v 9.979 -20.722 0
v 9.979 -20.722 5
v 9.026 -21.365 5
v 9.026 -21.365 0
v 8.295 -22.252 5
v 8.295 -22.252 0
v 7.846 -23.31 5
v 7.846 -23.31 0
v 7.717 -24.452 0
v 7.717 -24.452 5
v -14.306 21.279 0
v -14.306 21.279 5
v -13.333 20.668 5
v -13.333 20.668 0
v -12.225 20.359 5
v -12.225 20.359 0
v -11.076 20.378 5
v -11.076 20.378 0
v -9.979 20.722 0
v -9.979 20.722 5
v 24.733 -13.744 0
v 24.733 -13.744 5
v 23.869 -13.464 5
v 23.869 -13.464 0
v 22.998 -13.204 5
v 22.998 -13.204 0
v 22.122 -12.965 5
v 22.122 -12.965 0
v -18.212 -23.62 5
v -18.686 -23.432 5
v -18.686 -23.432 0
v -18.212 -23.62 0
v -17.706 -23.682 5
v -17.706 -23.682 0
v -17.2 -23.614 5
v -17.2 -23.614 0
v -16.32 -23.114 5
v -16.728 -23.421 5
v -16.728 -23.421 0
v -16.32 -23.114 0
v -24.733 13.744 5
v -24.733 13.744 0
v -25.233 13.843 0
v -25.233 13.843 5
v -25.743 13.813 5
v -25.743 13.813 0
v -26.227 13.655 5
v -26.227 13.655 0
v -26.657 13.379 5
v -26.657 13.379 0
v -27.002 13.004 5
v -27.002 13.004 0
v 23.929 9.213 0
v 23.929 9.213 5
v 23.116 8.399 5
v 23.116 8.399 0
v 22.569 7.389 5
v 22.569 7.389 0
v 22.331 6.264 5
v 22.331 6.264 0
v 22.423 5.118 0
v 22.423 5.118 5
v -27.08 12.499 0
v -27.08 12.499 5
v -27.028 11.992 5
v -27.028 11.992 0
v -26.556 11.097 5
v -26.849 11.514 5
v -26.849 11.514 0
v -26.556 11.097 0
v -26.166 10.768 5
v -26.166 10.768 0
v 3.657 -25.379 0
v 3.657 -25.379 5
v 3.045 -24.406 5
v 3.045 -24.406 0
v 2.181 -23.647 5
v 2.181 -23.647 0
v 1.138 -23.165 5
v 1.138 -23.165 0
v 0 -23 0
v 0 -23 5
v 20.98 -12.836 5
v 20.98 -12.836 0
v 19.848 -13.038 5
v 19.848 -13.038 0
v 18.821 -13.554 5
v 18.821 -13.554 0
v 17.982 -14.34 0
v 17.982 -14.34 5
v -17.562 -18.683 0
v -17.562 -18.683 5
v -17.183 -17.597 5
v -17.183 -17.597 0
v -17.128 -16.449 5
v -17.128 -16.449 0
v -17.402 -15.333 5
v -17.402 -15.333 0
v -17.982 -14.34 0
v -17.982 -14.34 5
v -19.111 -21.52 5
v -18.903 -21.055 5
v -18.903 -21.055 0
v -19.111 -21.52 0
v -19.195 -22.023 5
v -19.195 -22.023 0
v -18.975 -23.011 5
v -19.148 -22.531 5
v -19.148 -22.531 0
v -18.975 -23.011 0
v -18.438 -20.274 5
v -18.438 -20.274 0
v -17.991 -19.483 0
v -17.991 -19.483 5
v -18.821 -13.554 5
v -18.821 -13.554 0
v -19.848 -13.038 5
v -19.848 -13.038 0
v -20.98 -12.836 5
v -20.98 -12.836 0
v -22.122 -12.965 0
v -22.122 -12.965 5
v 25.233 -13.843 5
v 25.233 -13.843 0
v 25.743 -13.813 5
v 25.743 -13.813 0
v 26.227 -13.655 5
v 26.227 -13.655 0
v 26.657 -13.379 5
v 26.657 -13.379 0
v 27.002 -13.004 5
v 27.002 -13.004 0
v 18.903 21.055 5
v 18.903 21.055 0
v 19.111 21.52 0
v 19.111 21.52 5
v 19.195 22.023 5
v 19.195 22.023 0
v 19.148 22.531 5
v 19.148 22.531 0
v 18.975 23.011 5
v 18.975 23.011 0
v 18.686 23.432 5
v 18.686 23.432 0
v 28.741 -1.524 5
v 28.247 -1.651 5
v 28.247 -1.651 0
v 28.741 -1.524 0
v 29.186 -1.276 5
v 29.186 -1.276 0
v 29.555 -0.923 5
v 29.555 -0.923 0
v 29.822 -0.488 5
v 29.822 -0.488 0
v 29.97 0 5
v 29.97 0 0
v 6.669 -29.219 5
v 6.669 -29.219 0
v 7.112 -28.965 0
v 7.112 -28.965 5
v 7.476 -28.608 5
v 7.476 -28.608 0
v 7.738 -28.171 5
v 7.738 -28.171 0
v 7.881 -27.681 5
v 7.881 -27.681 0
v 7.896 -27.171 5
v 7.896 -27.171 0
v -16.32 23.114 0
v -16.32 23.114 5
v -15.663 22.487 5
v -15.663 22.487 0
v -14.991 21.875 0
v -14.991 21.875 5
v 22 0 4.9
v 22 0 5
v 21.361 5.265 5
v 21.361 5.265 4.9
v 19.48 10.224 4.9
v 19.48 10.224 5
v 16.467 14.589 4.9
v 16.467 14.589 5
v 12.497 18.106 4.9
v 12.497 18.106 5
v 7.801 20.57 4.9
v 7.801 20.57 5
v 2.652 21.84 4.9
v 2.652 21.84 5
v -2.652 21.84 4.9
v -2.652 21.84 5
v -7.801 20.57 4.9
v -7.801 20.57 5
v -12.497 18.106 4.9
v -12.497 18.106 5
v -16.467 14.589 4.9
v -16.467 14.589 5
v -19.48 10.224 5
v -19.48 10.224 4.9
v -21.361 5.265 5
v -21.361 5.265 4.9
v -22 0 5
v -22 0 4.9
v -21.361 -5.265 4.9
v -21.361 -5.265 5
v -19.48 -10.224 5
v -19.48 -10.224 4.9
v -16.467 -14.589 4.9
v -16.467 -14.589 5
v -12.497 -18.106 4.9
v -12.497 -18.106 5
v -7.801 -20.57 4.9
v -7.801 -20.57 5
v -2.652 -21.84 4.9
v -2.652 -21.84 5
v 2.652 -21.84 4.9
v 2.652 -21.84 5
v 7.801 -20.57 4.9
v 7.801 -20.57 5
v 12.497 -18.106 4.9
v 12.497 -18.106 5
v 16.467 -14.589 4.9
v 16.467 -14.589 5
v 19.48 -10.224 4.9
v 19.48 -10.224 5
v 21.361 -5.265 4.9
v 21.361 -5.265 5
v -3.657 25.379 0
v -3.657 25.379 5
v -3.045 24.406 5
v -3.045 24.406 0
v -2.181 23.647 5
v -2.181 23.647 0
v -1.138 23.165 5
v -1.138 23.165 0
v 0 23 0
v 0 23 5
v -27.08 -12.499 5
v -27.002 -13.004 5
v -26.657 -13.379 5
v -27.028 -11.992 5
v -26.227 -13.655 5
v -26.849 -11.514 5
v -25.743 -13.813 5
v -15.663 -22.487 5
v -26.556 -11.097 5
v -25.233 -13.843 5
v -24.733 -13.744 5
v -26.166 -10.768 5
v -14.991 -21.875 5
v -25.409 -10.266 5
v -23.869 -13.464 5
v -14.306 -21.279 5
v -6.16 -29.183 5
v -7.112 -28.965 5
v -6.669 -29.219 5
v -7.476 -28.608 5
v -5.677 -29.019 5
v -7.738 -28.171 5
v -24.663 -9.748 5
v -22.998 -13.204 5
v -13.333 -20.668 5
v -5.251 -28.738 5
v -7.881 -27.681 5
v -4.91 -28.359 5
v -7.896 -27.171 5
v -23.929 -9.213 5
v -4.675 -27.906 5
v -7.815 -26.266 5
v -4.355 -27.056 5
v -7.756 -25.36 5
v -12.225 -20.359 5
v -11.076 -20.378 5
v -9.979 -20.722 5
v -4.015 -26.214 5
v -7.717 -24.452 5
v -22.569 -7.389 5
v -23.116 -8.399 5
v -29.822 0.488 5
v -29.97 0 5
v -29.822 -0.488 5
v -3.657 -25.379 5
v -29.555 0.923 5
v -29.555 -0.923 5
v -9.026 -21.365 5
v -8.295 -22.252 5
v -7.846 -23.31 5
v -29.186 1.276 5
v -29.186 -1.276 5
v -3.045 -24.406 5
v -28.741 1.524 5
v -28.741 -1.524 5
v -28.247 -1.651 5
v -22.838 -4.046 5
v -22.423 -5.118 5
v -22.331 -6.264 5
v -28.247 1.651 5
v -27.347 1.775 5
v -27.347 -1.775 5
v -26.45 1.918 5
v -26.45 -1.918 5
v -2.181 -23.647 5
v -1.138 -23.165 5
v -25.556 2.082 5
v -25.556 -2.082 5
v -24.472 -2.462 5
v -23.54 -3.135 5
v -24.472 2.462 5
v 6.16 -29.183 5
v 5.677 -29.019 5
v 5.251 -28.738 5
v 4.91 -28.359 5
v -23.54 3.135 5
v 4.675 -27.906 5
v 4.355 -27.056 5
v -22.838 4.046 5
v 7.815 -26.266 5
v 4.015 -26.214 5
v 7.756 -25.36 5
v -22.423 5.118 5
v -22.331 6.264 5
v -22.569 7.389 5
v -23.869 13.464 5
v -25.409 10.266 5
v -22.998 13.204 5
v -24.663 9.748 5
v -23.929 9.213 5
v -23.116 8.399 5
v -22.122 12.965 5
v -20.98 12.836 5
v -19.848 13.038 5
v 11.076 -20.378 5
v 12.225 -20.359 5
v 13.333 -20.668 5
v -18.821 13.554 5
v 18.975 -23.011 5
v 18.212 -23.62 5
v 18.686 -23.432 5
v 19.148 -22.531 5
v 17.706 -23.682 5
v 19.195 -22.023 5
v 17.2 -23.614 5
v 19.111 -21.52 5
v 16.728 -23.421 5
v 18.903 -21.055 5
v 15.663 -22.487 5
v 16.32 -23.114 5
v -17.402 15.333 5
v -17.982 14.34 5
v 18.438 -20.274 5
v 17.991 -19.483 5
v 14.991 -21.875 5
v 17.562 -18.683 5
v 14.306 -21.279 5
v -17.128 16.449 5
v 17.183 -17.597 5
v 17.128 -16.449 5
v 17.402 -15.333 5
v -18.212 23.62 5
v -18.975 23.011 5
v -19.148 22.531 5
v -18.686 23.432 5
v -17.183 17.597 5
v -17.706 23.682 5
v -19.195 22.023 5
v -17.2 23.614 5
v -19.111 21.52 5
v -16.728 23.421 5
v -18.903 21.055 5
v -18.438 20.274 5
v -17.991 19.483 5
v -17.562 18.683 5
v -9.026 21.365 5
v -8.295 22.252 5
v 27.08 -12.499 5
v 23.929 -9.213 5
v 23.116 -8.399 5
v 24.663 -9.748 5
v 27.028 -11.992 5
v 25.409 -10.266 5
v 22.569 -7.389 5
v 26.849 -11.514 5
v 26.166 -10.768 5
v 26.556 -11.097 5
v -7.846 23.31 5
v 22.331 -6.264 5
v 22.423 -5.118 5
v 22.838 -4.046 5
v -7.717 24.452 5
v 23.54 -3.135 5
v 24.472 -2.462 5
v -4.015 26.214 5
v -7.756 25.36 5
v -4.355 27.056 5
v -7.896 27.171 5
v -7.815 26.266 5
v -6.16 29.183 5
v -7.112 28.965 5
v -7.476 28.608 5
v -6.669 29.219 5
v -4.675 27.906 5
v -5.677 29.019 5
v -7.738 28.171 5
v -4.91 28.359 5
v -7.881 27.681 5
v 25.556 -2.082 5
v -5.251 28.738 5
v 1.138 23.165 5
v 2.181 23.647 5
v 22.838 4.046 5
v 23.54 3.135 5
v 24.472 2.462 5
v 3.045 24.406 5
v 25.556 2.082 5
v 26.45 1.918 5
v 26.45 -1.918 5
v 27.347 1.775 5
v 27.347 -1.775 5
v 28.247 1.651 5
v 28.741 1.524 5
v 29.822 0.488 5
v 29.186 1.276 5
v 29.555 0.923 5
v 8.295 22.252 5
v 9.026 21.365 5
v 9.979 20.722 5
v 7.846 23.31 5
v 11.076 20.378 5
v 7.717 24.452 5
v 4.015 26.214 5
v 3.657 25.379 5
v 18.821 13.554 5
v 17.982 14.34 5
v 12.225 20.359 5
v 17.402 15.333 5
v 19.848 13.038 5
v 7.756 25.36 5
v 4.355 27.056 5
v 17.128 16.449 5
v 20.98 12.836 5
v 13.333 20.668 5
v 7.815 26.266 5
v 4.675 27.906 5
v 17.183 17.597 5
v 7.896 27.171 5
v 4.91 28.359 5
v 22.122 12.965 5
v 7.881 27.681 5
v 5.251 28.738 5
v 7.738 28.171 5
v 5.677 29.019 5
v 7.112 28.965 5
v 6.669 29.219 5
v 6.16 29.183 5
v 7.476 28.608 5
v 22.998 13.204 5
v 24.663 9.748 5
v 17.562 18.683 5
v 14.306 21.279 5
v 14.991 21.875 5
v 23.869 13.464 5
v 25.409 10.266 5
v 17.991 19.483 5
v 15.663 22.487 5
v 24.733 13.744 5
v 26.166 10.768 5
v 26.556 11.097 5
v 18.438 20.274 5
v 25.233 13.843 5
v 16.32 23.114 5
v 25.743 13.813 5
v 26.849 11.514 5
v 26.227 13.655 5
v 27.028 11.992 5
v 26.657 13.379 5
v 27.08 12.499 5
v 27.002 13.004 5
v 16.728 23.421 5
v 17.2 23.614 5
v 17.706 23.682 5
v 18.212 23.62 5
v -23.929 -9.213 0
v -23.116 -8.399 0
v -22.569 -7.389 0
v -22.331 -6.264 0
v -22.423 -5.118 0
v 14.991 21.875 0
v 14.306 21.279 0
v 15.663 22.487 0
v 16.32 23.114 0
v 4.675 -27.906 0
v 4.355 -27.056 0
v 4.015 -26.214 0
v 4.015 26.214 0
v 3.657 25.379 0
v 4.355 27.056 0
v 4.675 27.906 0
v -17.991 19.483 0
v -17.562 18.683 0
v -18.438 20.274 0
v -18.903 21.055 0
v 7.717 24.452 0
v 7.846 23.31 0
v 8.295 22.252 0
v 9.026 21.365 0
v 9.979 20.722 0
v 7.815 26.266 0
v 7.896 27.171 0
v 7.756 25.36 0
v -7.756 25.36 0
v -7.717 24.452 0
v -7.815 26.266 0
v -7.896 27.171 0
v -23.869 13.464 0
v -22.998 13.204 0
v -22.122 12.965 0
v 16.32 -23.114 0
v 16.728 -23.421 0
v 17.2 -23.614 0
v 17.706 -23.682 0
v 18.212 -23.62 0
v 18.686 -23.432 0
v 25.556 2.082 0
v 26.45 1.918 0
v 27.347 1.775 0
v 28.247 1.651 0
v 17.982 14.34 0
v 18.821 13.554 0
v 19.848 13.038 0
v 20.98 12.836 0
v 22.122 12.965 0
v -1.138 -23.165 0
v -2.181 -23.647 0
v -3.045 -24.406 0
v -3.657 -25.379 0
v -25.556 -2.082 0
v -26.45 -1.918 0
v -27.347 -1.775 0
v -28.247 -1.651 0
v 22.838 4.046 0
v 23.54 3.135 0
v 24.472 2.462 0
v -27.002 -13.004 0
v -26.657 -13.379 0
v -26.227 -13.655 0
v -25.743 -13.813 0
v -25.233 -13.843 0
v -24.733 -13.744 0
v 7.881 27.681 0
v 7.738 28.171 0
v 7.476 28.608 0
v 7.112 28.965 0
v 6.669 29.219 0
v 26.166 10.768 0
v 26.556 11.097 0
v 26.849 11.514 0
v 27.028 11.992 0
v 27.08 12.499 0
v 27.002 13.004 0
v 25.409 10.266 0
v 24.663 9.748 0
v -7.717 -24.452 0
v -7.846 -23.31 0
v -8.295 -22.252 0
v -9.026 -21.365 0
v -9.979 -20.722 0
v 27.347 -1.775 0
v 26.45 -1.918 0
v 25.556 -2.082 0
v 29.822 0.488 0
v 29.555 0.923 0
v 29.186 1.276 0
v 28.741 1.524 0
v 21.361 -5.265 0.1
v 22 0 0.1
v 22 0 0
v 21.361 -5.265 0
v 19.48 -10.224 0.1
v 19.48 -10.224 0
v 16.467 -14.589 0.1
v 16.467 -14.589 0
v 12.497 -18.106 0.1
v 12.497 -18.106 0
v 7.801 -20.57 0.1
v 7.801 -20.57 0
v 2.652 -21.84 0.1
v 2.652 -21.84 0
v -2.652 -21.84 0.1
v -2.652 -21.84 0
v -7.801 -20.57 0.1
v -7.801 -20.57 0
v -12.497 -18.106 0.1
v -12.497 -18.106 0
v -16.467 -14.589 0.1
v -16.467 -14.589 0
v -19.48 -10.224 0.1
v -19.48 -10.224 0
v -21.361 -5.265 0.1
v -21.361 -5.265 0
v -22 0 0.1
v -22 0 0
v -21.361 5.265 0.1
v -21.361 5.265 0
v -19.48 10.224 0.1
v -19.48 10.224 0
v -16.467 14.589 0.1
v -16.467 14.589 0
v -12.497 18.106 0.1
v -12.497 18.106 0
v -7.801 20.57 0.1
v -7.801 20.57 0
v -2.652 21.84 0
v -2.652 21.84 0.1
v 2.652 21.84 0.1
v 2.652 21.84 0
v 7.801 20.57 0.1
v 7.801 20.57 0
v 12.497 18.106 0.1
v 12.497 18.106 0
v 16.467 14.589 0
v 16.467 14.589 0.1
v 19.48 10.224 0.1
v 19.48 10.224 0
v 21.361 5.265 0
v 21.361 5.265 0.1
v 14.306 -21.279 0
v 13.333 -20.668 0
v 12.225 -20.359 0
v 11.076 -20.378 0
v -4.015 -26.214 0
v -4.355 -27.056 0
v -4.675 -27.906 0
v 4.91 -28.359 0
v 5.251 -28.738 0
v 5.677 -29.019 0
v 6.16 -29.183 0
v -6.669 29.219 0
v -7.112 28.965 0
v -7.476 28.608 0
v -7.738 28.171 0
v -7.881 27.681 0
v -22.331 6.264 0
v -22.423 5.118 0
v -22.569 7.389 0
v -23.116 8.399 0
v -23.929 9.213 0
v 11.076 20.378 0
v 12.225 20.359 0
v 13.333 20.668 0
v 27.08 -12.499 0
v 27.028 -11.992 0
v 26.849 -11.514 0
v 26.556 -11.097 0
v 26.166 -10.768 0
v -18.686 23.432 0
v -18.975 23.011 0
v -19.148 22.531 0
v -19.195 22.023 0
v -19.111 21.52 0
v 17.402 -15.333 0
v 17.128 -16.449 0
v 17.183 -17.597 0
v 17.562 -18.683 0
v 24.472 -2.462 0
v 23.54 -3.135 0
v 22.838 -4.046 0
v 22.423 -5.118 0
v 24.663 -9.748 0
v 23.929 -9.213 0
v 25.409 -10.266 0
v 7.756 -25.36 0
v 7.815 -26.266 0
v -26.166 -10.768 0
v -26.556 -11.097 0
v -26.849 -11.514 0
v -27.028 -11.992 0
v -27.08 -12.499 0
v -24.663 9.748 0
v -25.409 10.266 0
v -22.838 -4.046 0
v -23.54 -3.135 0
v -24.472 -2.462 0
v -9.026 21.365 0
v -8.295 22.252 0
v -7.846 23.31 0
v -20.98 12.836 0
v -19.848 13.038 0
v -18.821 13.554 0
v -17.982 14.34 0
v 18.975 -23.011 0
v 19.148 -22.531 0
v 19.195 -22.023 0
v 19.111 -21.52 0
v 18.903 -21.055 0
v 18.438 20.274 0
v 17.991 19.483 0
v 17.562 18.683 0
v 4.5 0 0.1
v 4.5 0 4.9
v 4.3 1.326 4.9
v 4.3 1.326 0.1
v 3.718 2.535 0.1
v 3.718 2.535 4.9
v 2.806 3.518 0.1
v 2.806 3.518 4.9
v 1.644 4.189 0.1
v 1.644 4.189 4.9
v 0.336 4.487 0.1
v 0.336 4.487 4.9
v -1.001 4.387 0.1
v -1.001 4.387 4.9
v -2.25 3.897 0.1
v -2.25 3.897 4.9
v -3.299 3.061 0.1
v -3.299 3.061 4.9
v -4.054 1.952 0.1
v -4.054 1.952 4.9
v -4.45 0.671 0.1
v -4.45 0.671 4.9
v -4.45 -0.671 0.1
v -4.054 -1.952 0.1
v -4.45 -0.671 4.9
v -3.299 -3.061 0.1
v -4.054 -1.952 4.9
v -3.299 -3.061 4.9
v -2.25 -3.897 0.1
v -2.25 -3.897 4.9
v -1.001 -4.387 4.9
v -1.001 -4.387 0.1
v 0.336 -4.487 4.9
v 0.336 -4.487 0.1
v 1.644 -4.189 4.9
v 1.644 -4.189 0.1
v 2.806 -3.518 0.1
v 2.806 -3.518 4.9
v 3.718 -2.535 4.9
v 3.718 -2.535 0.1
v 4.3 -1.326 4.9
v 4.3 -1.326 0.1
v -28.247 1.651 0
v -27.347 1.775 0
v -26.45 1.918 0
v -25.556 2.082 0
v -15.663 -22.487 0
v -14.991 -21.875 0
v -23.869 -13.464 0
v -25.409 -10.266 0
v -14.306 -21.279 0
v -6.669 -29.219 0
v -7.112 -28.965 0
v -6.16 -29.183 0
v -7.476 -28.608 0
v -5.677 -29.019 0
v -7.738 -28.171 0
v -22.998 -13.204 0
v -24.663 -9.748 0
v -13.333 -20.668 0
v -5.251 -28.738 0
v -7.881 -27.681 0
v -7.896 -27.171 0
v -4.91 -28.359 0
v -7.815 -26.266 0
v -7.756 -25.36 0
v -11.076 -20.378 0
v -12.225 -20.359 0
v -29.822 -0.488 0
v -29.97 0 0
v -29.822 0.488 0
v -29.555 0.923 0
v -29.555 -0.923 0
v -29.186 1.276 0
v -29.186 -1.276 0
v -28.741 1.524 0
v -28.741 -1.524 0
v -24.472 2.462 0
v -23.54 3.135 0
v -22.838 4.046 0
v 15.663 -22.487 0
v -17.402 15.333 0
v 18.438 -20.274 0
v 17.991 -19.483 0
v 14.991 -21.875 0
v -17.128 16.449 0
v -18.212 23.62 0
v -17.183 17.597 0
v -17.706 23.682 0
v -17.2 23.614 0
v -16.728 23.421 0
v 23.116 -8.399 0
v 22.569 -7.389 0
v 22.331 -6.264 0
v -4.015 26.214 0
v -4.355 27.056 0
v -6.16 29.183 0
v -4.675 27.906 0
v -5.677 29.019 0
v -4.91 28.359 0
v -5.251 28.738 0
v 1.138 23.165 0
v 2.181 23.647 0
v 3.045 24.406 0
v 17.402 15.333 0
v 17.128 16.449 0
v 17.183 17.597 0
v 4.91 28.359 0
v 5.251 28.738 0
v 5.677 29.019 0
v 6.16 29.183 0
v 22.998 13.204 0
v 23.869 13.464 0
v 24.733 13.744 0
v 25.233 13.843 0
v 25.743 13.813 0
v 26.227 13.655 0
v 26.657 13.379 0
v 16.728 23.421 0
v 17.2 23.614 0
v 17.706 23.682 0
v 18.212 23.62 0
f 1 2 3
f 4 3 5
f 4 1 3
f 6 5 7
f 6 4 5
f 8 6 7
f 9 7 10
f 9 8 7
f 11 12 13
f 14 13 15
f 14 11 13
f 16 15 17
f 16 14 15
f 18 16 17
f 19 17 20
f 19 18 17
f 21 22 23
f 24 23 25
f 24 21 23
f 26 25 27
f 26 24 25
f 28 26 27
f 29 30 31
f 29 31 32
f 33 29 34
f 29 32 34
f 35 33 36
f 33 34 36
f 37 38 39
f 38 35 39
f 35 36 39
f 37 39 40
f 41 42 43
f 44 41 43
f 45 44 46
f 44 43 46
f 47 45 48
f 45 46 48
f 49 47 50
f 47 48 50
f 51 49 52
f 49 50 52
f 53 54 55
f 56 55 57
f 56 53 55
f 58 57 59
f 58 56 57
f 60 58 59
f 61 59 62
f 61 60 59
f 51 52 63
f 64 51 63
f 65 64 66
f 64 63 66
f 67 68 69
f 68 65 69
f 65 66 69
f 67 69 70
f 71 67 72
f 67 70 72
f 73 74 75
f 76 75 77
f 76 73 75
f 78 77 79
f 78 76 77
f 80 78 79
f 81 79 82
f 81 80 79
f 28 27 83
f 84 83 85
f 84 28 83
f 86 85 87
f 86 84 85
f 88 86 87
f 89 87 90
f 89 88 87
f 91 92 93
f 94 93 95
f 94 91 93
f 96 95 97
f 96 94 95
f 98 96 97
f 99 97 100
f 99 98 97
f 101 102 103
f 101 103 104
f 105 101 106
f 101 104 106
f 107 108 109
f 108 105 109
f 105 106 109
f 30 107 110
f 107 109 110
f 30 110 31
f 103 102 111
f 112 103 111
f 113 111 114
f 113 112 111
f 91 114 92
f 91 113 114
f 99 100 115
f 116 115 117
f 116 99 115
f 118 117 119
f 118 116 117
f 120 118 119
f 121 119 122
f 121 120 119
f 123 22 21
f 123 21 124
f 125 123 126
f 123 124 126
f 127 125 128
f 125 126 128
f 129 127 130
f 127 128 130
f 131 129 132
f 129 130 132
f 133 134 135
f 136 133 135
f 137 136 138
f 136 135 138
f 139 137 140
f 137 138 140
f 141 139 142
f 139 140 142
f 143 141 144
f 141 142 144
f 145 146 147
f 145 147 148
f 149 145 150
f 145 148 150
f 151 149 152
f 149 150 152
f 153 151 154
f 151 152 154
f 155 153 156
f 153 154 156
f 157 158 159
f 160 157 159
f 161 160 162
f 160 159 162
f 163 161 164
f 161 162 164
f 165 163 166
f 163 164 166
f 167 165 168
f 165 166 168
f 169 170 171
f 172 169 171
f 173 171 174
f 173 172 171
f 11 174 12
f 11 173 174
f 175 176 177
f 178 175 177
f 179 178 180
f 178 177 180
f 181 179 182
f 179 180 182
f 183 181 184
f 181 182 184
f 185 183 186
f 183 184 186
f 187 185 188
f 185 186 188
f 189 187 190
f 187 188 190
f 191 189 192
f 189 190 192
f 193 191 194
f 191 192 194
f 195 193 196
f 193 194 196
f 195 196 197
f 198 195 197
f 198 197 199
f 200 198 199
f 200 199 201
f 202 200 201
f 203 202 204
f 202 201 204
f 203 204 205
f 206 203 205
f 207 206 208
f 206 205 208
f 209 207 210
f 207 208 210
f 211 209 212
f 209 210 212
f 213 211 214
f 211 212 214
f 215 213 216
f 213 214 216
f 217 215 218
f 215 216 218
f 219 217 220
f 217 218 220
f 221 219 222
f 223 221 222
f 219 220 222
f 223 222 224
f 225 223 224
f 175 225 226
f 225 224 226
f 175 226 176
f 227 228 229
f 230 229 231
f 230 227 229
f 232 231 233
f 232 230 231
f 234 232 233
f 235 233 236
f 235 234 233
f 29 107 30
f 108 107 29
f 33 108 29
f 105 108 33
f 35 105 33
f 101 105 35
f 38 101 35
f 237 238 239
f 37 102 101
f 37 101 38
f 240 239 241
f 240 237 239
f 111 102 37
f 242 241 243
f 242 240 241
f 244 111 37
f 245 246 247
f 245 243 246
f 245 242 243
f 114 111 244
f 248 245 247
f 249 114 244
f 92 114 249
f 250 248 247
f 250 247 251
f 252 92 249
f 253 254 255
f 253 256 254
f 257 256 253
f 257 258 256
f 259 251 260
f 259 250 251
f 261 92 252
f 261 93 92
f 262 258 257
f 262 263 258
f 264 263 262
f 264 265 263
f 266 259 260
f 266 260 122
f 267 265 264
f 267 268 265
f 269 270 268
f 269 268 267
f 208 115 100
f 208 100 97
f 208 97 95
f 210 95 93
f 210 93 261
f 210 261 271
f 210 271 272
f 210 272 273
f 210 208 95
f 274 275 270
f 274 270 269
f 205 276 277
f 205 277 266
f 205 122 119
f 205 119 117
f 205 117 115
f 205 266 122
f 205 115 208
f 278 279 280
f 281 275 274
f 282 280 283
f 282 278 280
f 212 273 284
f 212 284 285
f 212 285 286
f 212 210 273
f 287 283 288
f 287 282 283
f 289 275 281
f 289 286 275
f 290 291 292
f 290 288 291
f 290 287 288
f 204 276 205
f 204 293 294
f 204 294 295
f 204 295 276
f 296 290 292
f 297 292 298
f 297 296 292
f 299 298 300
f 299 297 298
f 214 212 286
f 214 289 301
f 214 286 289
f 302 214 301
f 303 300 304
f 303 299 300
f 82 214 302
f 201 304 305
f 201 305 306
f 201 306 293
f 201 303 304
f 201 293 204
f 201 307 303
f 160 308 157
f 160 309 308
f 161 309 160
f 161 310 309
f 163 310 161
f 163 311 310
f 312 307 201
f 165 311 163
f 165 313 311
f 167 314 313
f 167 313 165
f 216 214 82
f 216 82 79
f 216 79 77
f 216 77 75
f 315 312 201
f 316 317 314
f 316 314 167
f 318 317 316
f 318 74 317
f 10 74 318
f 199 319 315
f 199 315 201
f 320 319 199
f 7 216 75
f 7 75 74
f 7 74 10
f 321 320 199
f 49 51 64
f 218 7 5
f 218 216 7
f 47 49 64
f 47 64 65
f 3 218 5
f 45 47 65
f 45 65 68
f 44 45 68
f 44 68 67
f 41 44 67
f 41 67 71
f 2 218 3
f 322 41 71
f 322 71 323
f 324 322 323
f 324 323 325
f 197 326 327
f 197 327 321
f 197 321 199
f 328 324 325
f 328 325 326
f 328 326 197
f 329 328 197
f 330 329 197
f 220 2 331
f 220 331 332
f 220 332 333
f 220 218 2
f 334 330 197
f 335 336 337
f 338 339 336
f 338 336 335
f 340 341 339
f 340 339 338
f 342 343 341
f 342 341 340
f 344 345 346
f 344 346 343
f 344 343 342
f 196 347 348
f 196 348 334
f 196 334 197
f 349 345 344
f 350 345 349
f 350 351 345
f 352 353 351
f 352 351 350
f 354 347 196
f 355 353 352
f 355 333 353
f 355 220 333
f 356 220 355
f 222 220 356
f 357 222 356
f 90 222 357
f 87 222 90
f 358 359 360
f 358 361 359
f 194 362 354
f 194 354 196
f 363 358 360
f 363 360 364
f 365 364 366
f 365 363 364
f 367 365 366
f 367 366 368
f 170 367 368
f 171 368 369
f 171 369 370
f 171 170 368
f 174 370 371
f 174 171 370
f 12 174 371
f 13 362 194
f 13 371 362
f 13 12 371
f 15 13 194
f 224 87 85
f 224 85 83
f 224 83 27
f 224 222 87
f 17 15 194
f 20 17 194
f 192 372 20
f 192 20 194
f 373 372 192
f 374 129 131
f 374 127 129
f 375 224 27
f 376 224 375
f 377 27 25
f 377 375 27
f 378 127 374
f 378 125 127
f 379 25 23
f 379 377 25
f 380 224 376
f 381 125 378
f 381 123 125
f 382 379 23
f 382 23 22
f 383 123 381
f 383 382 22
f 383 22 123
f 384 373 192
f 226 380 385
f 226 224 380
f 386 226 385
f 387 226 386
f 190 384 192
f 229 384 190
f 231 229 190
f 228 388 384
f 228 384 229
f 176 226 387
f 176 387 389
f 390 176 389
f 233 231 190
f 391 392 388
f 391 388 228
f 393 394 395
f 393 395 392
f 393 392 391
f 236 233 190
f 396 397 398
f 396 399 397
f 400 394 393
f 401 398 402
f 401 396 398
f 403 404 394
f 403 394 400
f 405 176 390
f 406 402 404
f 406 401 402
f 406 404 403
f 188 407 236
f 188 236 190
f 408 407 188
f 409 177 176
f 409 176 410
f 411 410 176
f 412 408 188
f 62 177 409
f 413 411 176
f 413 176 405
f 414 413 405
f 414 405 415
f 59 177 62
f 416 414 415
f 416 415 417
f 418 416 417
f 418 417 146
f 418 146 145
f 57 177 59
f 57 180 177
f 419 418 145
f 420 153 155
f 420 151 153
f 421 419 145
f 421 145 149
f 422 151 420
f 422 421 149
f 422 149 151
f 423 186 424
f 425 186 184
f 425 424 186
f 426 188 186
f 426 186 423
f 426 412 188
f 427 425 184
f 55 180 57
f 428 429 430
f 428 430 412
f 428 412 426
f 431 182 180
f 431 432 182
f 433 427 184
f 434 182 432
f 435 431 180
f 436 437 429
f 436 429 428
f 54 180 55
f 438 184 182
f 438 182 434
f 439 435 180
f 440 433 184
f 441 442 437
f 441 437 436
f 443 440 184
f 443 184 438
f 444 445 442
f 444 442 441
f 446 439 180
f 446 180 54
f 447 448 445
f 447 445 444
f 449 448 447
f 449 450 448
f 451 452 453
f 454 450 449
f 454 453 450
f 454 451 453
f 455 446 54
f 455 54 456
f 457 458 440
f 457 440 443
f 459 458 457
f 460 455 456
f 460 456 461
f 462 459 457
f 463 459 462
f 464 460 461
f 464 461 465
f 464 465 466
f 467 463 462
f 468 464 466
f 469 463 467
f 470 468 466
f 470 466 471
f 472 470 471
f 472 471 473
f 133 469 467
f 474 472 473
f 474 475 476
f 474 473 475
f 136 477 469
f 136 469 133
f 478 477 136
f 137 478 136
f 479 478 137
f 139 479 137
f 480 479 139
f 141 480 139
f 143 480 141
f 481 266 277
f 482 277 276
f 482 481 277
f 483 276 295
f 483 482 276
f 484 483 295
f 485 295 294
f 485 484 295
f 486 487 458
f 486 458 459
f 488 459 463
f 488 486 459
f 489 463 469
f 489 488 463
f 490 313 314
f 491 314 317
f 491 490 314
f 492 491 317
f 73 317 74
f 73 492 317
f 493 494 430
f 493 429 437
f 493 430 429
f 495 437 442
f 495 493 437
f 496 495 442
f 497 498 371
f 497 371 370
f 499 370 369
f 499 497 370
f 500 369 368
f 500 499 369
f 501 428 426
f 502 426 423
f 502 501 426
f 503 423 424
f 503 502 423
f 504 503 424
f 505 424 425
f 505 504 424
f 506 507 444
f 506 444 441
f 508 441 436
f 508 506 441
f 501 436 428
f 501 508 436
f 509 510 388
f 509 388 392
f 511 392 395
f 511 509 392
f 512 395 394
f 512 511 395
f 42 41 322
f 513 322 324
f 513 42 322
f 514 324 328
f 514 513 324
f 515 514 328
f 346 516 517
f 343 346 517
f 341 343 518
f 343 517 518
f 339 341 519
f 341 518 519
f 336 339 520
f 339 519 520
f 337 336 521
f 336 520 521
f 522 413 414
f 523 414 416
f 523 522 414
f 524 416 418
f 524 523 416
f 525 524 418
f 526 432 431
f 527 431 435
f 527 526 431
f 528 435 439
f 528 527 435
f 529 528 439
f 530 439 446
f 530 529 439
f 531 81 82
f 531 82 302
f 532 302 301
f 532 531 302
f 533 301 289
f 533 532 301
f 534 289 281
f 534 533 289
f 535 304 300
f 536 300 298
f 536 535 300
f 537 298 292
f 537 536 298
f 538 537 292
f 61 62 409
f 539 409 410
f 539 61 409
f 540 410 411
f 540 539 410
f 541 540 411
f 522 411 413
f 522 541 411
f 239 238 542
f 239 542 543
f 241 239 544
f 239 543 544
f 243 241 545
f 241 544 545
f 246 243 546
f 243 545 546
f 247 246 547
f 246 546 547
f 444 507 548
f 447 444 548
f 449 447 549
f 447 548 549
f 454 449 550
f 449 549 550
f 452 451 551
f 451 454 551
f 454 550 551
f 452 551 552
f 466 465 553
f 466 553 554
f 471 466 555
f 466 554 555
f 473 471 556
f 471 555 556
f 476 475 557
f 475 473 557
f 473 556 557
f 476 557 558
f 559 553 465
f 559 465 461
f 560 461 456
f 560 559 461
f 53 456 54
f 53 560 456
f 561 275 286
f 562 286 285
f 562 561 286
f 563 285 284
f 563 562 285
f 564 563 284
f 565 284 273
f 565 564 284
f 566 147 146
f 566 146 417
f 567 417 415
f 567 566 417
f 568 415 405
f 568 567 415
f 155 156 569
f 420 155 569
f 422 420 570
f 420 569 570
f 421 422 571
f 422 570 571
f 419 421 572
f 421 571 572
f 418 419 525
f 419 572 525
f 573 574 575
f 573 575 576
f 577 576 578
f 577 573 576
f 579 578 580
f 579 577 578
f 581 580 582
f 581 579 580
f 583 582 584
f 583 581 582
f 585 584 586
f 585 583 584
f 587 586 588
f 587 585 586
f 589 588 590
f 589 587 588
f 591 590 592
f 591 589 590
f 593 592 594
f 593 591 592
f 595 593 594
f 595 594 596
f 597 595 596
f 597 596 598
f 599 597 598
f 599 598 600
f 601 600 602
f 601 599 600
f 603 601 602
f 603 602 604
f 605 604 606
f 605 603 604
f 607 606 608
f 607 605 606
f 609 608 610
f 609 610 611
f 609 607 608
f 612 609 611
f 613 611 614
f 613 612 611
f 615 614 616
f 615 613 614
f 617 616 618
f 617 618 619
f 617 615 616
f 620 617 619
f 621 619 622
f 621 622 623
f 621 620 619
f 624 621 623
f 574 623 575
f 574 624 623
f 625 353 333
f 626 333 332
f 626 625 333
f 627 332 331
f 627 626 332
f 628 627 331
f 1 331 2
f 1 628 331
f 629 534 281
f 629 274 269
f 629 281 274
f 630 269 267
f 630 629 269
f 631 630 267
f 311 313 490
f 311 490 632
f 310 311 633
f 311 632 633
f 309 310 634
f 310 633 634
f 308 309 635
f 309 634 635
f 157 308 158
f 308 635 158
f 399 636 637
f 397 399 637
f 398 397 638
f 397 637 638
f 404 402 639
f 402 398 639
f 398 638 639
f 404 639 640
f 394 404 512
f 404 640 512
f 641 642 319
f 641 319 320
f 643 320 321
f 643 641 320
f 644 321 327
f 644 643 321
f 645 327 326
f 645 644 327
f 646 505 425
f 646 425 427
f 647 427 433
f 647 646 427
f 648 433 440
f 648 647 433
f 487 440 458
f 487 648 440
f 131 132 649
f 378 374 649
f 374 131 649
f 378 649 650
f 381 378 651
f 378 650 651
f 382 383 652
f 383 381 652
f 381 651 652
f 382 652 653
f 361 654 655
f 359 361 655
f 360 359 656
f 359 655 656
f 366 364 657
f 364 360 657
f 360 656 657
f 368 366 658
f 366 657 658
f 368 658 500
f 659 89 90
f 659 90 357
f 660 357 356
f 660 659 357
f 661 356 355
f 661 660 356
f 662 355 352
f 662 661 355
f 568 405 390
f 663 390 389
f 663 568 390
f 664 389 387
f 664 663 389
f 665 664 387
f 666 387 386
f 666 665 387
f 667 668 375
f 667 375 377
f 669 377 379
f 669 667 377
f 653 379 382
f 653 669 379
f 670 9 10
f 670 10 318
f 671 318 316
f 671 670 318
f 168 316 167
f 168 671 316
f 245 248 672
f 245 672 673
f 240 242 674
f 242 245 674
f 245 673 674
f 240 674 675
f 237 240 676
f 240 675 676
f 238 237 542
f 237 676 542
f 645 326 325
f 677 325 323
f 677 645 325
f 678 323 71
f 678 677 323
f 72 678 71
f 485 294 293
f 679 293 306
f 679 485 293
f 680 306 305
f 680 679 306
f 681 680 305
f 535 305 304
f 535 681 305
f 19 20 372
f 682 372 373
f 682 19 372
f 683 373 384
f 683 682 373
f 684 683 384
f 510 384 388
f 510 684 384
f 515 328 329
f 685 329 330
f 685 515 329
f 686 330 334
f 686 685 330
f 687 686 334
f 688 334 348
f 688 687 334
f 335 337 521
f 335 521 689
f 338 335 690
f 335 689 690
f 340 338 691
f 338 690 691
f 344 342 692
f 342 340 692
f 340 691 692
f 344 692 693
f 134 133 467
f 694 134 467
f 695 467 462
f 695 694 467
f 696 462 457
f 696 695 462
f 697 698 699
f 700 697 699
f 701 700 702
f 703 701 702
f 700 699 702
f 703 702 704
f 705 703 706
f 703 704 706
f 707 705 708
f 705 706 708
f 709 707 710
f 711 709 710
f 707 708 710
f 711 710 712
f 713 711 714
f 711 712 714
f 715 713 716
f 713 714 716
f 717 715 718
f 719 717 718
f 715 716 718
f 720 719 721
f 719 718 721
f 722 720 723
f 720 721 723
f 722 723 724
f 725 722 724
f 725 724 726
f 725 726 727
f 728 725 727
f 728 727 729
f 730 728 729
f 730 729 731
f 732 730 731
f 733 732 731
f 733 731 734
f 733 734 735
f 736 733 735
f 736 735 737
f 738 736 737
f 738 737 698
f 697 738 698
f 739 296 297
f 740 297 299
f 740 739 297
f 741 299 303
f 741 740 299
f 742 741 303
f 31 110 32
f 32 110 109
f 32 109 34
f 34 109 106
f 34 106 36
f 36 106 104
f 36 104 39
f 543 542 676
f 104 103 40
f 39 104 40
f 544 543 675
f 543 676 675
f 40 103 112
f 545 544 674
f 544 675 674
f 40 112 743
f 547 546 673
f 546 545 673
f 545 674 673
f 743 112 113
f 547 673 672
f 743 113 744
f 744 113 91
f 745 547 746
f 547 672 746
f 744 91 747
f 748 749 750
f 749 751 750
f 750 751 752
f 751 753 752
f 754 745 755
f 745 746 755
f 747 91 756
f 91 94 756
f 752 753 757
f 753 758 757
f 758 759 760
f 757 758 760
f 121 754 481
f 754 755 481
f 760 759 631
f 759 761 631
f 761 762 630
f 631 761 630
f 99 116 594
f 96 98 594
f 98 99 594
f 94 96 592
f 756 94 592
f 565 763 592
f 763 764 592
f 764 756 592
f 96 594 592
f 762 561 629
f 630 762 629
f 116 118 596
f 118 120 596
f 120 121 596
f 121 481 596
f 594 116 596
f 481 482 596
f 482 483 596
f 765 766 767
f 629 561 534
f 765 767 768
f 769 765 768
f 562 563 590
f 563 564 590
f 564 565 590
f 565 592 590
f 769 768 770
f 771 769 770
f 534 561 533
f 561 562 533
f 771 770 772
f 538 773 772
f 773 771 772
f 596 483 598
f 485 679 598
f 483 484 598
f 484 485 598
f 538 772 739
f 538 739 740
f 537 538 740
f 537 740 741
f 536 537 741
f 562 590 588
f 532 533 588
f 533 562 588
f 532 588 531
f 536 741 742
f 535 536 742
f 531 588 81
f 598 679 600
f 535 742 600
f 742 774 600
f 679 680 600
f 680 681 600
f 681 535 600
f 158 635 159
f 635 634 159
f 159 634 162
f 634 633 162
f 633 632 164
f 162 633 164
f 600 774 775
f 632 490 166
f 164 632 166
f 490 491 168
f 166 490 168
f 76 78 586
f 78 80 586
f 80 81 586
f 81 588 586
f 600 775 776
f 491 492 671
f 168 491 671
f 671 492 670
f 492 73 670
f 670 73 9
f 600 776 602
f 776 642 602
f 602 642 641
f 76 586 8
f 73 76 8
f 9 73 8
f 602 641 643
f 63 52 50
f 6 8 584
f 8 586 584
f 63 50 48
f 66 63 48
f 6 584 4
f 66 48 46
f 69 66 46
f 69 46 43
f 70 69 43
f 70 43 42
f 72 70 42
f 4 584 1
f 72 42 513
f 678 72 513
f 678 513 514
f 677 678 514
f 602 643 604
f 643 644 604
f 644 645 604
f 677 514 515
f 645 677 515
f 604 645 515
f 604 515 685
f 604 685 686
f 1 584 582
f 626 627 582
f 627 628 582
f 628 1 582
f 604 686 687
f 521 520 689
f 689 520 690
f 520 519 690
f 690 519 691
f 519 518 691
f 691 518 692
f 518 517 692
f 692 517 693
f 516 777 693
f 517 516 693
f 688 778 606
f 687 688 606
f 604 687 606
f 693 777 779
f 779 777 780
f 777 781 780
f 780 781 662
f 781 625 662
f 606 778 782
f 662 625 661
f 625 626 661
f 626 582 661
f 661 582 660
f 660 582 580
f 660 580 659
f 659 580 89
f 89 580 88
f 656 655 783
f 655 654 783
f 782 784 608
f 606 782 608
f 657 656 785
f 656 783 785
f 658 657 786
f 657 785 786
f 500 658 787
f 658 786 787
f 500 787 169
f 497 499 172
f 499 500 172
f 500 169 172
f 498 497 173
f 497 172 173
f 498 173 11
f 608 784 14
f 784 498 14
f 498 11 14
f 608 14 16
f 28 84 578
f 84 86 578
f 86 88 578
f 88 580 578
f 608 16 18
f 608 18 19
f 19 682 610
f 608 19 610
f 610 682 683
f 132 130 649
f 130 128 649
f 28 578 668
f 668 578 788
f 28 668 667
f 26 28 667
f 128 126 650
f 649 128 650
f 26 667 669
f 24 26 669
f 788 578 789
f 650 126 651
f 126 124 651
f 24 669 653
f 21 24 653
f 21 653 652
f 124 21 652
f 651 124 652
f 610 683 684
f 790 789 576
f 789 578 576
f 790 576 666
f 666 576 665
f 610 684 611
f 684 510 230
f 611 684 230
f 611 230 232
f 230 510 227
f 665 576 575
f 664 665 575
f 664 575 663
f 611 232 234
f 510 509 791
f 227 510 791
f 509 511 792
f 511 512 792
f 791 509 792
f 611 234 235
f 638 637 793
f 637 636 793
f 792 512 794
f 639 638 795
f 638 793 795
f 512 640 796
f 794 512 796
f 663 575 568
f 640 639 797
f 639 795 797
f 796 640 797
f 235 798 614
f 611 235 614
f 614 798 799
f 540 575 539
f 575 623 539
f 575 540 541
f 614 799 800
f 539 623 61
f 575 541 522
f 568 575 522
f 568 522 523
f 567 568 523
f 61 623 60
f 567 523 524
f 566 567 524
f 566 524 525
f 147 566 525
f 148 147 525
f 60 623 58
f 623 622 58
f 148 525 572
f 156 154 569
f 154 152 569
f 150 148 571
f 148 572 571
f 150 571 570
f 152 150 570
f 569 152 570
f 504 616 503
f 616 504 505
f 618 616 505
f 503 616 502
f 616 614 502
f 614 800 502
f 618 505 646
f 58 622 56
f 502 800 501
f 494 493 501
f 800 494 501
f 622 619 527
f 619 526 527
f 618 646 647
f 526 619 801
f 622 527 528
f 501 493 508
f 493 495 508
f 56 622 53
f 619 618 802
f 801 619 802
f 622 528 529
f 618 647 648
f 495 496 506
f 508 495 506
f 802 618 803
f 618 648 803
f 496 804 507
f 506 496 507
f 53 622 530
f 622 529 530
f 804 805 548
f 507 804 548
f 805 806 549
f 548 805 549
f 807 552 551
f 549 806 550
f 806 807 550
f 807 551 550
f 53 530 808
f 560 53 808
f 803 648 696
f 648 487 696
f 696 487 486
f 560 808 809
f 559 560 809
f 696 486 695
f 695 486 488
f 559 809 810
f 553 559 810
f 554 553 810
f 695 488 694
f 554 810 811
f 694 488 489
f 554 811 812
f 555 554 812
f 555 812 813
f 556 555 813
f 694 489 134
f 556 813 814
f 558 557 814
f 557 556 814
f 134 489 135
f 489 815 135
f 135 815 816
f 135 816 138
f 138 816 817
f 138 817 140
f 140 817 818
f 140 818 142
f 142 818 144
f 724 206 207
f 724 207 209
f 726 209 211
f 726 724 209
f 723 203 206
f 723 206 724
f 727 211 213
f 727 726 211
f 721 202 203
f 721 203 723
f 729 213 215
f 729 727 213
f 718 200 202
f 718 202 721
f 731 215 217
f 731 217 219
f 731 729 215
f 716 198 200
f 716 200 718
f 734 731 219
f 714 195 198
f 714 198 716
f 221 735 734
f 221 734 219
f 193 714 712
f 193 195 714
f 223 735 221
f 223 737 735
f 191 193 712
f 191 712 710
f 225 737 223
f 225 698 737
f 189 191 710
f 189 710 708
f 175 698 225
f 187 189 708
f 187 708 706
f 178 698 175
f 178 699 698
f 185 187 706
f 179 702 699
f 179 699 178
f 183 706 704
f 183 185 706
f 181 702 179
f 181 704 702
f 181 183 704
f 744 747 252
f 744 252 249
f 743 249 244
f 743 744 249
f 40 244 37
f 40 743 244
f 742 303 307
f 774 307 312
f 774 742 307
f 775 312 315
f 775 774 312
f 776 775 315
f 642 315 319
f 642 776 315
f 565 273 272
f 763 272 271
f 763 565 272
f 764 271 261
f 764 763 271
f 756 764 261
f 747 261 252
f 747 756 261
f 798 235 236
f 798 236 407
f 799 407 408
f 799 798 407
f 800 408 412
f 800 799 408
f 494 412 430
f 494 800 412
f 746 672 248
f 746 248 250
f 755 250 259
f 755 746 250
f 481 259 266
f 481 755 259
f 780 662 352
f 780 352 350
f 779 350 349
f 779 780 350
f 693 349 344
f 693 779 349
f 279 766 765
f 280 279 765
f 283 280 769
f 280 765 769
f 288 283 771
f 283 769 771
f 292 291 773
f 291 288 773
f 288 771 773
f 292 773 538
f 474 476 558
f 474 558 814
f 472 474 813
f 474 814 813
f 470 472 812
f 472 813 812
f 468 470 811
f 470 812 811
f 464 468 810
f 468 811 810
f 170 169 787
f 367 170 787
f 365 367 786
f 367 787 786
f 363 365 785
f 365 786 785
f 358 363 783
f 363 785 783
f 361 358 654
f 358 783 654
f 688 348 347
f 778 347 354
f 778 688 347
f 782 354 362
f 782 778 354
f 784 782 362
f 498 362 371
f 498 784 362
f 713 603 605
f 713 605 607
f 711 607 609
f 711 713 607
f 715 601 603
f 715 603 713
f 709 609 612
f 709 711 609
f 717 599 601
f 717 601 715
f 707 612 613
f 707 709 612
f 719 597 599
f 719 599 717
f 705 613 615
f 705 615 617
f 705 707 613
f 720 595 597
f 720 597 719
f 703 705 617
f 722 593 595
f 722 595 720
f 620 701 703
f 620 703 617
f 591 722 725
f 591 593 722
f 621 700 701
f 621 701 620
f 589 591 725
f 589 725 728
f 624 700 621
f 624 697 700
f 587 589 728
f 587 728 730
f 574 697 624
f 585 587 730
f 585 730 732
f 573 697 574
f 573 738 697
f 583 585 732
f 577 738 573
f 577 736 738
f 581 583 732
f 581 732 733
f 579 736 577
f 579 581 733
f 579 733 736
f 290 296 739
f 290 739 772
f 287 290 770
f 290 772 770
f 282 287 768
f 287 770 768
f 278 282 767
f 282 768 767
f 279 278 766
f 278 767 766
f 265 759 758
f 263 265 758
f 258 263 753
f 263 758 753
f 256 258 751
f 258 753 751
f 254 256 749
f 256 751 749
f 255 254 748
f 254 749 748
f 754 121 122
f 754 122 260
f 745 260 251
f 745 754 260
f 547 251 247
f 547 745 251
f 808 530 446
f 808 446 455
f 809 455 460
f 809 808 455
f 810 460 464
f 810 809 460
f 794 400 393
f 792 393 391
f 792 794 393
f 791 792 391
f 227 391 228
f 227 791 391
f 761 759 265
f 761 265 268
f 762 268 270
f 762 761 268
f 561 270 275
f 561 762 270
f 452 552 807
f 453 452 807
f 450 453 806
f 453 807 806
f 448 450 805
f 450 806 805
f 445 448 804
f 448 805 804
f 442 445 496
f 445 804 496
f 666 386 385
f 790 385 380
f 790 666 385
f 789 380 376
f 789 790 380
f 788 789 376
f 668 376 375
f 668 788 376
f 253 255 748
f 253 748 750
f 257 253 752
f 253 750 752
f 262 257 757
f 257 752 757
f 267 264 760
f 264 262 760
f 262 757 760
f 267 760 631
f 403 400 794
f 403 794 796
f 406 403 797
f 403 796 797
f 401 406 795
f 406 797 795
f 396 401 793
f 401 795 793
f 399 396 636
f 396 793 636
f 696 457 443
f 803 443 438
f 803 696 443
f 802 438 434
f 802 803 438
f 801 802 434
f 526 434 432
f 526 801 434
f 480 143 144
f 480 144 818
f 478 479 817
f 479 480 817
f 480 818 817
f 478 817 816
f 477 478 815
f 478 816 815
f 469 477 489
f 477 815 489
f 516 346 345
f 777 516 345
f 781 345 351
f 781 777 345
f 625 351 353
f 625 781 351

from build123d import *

# Parameters (mm, degrees)
SKETCH_1_R               = 30
EXTRUDE_1_DEPTH          = 5
SKETCH_2_R               = 4.5
CUT_EXTRUDE_1_DEPTH      = 43.720018727
CUT_EXTRUDE_7_DEPTH      = 43.720018727
PATTERN_CIRCULAR_1_COUNT = 14
FILLET_3_R               = 2
SKETCH_4_R               = 22
CUT_EXTRUDE_9_DEPTH      = 0.1
CUT_EXTRUDE_START        = -0.1
SKETCH_5_R               = 22
CUT_EXTRUDE_10_DEPTH     = 0.1


with BuildPart() as part:
    # 草图1 → 凸台-拉伸1 (new body)
    with BuildSketch(Plane.XY):
        Circle(SKETCH_1_R)
    extrude(amount=EXTRUDE_1_DEPTH)

    # 草图2 → 切除-拉伸1 (cut, through all)
    with BuildSketch(Plane.XY.offset(5)):
        Circle(SKETCH_2_R)
    extrude(amount=-CUT_EXTRUDE_1_DEPTH, mode=Mode.SUBTRACT)

    # 草图3 → 切除-拉伸7 (cut, through all)
    with BuildSketch(Plane.XY):
        with BuildLine():
            Line((0, 23), (0, 30))
            ThreePointArc((0, 30), (-2.625482426, 29.884893208), (-5.230817461, 29.540456135))
            ThreePointArc((-5.230817461, 29.540456135), (-4.501731259, 27.437843644), (-3.656838203, 25.379032895))
            ThreePointArc((-3.656838203, 25.379032895), (-2.181299106, 23.647100626), (0, 23))
        make_face()
        with BuildLine():
            ThreePointArc((5.230817461, 29.540456135), (2.625482426, 29.884893208), (0, 30))
            Line((0, 30), (0, 23))
            ThreePointArc((0, 23), (2.181299106, 23.647100626), (3.656838203, 25.379032895))
            ThreePointArc((3.656838203, 25.379032895), (4.501731259, 27.437843644), (5.230817461, 29.540456135))
        make_face()
    cut_extrude_7 = extrude(amount=CUT_EXTRUDE_7_DEPTH, mode=Mode.SUBTRACT)

    # 阵列(圆周)1: 切除-拉伸7 ×14 about axis
    pattern_circular_1_axis = Axis((0, 0, 0), (0, 0, 1))
    for i in range(1, PATTERN_CIRCULAR_1_COUNT):
        add(cut_extrude_7.rotate(pattern_circular_1_axis, i * 360 / PATTERN_CIRCULAR_1_COUNT), mode=Mode.SUBTRACT)

    # 圆角3
    # the kernel refuses this fillet: 2 mm, written as the material it takes off along each edge
    with BuildSketch(Plane(origin=(5.230817461, 29.540456135, -4.577149267), x_dir=(-0.32171090906550515, -0.9468379433610834, 0), z_dir=(0, 0, 1)), Plane(origin=(-19.834297271, 22.507790913, -4.577149267), x_dir=(0.5396842419659282, -0.8418675186593562, 0), z_dir=(0, 0, 1)), Plane(origin=(-27.635848838, 11.673039835, -4.577149267), x_dir=(0.8515113273463623, -0.5243362083633328, 0), z_dir=(0, 0, 1)), Plane(origin=(-29.963781612, -1.473699943, -4.577149267), x_dir=(0.9946861512447445, -0.10295368143936073, 0), z_dir=(0, 0, 1)), Plane(origin=(-26.357019955, -14.328555373, -4.577149267), x_dir=(0.9408511838640222, 0.33882008473770825, 0), z_dir=(0, 0, 1)), Plane(origin=(-17.529927249, -24.345464683, -4.577149267), x_dir=(0.7006691007364907, 0.7134863777768412, 0), z_dir=(0, 0, 1)), Plane(origin=(-5.230817461, -29.540456135, -4.577149267), x_dir=(0.32171090906550703, 0.9468379433610828, 0), z_dir=(0, 0, 1)), Plane(origin=(8.104319877, -28.88459796, -4.577149267), x_dir=(-0.12096607367127866, 0.9926566420573404, 0), z_dir=(0, 0, 1)), Plane(origin=(19.834297271, -22.507790913, -4.577149267), x_dir=(-0.5396842419659312, 0.8418675186593543, 0), z_dir=(0, 0, 1)), Plane(origin=(27.635848838, -11.673039835, -4.577149267), x_dir=(-0.8515113273463634, 0.524336208363331, 0), z_dir=(0, 0, 1)), Plane(origin=(29.963781612, 1.473699943, -4.577149267), x_dir=(-0.9946861512447445, 0.10295368143936018, 0), z_dir=(0, 0, 1)), Plane(origin=(26.357019955, 14.328555373, -4.577149267), x_dir=(-0.9408511838640224, -0.3388200847377076, 0), z_dir=(0, 0, 1)), Plane(origin=(17.529927249, 24.345464683, -4.577149267), x_dir=(-0.7006691007364938, -0.7134863777768381, 0), z_dir=(0, 0, 1))) as fillet_3_piece_1:
        with BuildLine():
            CenterArc((1.769304863, 1.999534384), FILLET_3_R, 185.227747584, 83.53589182)
            ThreePointArc((-0.222375917, 1.817304657), (-0.125054645, 0.906955521), (0, 0))
            ThreePointArc((0, 0), (0.863075543, 0.009312326), (1.726151086, 0))
        make_face()
    extrude(amount=14.154298534, mode=Mode.SUBTRACT)
    with BuildSketch(Plane(origin=(-5.230817461, 29.540456135, -4.577149267), x_dir=(-0.9789028377703077, -0.20432629347501635, 0), z_dir=(0, 0, 1)), Plane(origin=(-17.529927249, 24.345464683, -4.577149267), x_dir=(-0.7933071253194062, -0.6088216527994549, 0), z_dir=(0, 0, 1)), Plane(origin=(-26.357019955, 14.328555373, -4.577149267), x_dir=(-0.4505872074255905, -0.8927324170793888, 0), z_dir=(0, 0, 1)), Plane(origin=(-29.963781612, 1.473699943, -4.577149267), x_dir=(-0.018622967011686854, -0.9998265775121612, 0), z_dir=(0, 0, 1)), Plane(origin=(-27.635848838, -11.673039835, -4.577149267), x_dir=(0.4170297804145827, -0.9088928222003764, 0), z_dir=(0, 0, 1)), Plane(origin=(-19.834297271, -22.507790913, -4.577149267), x_dir=(0.7700846652951304, -0.6379416966128542, 0), z_dir=(0, 0, 1)), Plane(origin=(-8.104319877, -28.88459796, -4.577149267), x_dir=(0.9706148377453508, -0.24063839416968846, 0), z_dir=(0, 0, 1)), Plane(origin=(5.230817461, -29.540456135, -4.577149267), x_dir=(0.9789028377703077, 0.20432629347501674, 0), z_dir=(0, 0, 1)), Plane(origin=(17.529927249, -24.345464683, -4.577149267), x_dir=(0.7933071253194082, 0.6088216527994523, 0), z_dir=(0, 0, 1)), Plane(origin=(26.357019955, -14.328555373, -4.577149267), x_dir=(0.45058720742559166, 0.8927324170793882, 0), z_dir=(0, 0, 1)), Plane(origin=(29.963781612, -1.473699943, -4.577149267), x_dir=(0.01862296701168685, 0.9998265775121612, 0), z_dir=(0, 0, 1)), Plane(origin=(27.635848838, 11.673039835, -4.577149267), x_dir=(-0.4170297804145869, 0.9088928222003745, 0), z_dir=(0, 0, 1)), Plane(origin=(19.834297271, 22.507790913, -4.577149267), x_dir=(-0.7700846652951312, 0.6379416966128533, 0), z_dir=(0, 0, 1)), Plane(origin=(8.104319877, 28.88459796, -4.577149267), x_dir=(-0.9706148377453518, 0.24063839416968458, 0), z_dir=(0, 0, 1))) as fillet_3_piece_2:
        with BuildLine():
            CenterArc((1.76983105, 1.999068659), FILLET_3_R, 188.212721849, 83.53589182)
            ThreePointArc((-0.209658025, 1.713371262), (-0.095585631, 0.857816705), (0, 0))
            ThreePointArc((0, 0), (0.915429853, -0.013970116), (1.830859707, 0))
        make_face()
    extrude(amount=14.154298534, mode=Mode.SUBTRACT)
    with BuildSketch(Plane(origin=(-8.104319877, 28.88459796, -4.577149267), x_dir=(0.9706148377453514, 0.24063839416968652, 0), z_dir=(0, 0, 1))) as fillet_3_piece_3:
        with BuildLine():
            CenterArc((1.76983105, -1.999068659), FILLET_3_R, 88.251386331, 83.53589182)
            ThreePointArc((-0.209658025, -1.713371262), (-0.095585631, -0.857816705), (0, 0))
            ThreePointArc((0, 0), (0.915429853, 0.013970116), (1.830859707, 0))
        make_face()
    extrude(amount=14.154298534, mode=Mode.SUBTRACT)

    # 草图4 → 切除-拉伸9 (cut)
    with BuildSketch(Plane.XY.offset(5)):
        Circle(SKETCH_4_R)
    extrude(amount=-CUT_EXTRUDE_9_DEPTH, mode=Mode.SUBTRACT)

    # 草图5 → 切除-拉伸10 (cut)
    with BuildSketch(Plane(origin=(0, 0, 0), x_dir=(-1, 0, 0), z_dir=(0, 0, -1)).offset(CUT_EXTRUDE_START)):
        with Locations(Location((0, 0, 0), (0, 0, 180))):
            Circle(SKETCH_5_R)
    extrude(amount=CUT_EXTRUDE_10_DEPTH, mode=Mode.SUBTRACT)


solid = part.part
